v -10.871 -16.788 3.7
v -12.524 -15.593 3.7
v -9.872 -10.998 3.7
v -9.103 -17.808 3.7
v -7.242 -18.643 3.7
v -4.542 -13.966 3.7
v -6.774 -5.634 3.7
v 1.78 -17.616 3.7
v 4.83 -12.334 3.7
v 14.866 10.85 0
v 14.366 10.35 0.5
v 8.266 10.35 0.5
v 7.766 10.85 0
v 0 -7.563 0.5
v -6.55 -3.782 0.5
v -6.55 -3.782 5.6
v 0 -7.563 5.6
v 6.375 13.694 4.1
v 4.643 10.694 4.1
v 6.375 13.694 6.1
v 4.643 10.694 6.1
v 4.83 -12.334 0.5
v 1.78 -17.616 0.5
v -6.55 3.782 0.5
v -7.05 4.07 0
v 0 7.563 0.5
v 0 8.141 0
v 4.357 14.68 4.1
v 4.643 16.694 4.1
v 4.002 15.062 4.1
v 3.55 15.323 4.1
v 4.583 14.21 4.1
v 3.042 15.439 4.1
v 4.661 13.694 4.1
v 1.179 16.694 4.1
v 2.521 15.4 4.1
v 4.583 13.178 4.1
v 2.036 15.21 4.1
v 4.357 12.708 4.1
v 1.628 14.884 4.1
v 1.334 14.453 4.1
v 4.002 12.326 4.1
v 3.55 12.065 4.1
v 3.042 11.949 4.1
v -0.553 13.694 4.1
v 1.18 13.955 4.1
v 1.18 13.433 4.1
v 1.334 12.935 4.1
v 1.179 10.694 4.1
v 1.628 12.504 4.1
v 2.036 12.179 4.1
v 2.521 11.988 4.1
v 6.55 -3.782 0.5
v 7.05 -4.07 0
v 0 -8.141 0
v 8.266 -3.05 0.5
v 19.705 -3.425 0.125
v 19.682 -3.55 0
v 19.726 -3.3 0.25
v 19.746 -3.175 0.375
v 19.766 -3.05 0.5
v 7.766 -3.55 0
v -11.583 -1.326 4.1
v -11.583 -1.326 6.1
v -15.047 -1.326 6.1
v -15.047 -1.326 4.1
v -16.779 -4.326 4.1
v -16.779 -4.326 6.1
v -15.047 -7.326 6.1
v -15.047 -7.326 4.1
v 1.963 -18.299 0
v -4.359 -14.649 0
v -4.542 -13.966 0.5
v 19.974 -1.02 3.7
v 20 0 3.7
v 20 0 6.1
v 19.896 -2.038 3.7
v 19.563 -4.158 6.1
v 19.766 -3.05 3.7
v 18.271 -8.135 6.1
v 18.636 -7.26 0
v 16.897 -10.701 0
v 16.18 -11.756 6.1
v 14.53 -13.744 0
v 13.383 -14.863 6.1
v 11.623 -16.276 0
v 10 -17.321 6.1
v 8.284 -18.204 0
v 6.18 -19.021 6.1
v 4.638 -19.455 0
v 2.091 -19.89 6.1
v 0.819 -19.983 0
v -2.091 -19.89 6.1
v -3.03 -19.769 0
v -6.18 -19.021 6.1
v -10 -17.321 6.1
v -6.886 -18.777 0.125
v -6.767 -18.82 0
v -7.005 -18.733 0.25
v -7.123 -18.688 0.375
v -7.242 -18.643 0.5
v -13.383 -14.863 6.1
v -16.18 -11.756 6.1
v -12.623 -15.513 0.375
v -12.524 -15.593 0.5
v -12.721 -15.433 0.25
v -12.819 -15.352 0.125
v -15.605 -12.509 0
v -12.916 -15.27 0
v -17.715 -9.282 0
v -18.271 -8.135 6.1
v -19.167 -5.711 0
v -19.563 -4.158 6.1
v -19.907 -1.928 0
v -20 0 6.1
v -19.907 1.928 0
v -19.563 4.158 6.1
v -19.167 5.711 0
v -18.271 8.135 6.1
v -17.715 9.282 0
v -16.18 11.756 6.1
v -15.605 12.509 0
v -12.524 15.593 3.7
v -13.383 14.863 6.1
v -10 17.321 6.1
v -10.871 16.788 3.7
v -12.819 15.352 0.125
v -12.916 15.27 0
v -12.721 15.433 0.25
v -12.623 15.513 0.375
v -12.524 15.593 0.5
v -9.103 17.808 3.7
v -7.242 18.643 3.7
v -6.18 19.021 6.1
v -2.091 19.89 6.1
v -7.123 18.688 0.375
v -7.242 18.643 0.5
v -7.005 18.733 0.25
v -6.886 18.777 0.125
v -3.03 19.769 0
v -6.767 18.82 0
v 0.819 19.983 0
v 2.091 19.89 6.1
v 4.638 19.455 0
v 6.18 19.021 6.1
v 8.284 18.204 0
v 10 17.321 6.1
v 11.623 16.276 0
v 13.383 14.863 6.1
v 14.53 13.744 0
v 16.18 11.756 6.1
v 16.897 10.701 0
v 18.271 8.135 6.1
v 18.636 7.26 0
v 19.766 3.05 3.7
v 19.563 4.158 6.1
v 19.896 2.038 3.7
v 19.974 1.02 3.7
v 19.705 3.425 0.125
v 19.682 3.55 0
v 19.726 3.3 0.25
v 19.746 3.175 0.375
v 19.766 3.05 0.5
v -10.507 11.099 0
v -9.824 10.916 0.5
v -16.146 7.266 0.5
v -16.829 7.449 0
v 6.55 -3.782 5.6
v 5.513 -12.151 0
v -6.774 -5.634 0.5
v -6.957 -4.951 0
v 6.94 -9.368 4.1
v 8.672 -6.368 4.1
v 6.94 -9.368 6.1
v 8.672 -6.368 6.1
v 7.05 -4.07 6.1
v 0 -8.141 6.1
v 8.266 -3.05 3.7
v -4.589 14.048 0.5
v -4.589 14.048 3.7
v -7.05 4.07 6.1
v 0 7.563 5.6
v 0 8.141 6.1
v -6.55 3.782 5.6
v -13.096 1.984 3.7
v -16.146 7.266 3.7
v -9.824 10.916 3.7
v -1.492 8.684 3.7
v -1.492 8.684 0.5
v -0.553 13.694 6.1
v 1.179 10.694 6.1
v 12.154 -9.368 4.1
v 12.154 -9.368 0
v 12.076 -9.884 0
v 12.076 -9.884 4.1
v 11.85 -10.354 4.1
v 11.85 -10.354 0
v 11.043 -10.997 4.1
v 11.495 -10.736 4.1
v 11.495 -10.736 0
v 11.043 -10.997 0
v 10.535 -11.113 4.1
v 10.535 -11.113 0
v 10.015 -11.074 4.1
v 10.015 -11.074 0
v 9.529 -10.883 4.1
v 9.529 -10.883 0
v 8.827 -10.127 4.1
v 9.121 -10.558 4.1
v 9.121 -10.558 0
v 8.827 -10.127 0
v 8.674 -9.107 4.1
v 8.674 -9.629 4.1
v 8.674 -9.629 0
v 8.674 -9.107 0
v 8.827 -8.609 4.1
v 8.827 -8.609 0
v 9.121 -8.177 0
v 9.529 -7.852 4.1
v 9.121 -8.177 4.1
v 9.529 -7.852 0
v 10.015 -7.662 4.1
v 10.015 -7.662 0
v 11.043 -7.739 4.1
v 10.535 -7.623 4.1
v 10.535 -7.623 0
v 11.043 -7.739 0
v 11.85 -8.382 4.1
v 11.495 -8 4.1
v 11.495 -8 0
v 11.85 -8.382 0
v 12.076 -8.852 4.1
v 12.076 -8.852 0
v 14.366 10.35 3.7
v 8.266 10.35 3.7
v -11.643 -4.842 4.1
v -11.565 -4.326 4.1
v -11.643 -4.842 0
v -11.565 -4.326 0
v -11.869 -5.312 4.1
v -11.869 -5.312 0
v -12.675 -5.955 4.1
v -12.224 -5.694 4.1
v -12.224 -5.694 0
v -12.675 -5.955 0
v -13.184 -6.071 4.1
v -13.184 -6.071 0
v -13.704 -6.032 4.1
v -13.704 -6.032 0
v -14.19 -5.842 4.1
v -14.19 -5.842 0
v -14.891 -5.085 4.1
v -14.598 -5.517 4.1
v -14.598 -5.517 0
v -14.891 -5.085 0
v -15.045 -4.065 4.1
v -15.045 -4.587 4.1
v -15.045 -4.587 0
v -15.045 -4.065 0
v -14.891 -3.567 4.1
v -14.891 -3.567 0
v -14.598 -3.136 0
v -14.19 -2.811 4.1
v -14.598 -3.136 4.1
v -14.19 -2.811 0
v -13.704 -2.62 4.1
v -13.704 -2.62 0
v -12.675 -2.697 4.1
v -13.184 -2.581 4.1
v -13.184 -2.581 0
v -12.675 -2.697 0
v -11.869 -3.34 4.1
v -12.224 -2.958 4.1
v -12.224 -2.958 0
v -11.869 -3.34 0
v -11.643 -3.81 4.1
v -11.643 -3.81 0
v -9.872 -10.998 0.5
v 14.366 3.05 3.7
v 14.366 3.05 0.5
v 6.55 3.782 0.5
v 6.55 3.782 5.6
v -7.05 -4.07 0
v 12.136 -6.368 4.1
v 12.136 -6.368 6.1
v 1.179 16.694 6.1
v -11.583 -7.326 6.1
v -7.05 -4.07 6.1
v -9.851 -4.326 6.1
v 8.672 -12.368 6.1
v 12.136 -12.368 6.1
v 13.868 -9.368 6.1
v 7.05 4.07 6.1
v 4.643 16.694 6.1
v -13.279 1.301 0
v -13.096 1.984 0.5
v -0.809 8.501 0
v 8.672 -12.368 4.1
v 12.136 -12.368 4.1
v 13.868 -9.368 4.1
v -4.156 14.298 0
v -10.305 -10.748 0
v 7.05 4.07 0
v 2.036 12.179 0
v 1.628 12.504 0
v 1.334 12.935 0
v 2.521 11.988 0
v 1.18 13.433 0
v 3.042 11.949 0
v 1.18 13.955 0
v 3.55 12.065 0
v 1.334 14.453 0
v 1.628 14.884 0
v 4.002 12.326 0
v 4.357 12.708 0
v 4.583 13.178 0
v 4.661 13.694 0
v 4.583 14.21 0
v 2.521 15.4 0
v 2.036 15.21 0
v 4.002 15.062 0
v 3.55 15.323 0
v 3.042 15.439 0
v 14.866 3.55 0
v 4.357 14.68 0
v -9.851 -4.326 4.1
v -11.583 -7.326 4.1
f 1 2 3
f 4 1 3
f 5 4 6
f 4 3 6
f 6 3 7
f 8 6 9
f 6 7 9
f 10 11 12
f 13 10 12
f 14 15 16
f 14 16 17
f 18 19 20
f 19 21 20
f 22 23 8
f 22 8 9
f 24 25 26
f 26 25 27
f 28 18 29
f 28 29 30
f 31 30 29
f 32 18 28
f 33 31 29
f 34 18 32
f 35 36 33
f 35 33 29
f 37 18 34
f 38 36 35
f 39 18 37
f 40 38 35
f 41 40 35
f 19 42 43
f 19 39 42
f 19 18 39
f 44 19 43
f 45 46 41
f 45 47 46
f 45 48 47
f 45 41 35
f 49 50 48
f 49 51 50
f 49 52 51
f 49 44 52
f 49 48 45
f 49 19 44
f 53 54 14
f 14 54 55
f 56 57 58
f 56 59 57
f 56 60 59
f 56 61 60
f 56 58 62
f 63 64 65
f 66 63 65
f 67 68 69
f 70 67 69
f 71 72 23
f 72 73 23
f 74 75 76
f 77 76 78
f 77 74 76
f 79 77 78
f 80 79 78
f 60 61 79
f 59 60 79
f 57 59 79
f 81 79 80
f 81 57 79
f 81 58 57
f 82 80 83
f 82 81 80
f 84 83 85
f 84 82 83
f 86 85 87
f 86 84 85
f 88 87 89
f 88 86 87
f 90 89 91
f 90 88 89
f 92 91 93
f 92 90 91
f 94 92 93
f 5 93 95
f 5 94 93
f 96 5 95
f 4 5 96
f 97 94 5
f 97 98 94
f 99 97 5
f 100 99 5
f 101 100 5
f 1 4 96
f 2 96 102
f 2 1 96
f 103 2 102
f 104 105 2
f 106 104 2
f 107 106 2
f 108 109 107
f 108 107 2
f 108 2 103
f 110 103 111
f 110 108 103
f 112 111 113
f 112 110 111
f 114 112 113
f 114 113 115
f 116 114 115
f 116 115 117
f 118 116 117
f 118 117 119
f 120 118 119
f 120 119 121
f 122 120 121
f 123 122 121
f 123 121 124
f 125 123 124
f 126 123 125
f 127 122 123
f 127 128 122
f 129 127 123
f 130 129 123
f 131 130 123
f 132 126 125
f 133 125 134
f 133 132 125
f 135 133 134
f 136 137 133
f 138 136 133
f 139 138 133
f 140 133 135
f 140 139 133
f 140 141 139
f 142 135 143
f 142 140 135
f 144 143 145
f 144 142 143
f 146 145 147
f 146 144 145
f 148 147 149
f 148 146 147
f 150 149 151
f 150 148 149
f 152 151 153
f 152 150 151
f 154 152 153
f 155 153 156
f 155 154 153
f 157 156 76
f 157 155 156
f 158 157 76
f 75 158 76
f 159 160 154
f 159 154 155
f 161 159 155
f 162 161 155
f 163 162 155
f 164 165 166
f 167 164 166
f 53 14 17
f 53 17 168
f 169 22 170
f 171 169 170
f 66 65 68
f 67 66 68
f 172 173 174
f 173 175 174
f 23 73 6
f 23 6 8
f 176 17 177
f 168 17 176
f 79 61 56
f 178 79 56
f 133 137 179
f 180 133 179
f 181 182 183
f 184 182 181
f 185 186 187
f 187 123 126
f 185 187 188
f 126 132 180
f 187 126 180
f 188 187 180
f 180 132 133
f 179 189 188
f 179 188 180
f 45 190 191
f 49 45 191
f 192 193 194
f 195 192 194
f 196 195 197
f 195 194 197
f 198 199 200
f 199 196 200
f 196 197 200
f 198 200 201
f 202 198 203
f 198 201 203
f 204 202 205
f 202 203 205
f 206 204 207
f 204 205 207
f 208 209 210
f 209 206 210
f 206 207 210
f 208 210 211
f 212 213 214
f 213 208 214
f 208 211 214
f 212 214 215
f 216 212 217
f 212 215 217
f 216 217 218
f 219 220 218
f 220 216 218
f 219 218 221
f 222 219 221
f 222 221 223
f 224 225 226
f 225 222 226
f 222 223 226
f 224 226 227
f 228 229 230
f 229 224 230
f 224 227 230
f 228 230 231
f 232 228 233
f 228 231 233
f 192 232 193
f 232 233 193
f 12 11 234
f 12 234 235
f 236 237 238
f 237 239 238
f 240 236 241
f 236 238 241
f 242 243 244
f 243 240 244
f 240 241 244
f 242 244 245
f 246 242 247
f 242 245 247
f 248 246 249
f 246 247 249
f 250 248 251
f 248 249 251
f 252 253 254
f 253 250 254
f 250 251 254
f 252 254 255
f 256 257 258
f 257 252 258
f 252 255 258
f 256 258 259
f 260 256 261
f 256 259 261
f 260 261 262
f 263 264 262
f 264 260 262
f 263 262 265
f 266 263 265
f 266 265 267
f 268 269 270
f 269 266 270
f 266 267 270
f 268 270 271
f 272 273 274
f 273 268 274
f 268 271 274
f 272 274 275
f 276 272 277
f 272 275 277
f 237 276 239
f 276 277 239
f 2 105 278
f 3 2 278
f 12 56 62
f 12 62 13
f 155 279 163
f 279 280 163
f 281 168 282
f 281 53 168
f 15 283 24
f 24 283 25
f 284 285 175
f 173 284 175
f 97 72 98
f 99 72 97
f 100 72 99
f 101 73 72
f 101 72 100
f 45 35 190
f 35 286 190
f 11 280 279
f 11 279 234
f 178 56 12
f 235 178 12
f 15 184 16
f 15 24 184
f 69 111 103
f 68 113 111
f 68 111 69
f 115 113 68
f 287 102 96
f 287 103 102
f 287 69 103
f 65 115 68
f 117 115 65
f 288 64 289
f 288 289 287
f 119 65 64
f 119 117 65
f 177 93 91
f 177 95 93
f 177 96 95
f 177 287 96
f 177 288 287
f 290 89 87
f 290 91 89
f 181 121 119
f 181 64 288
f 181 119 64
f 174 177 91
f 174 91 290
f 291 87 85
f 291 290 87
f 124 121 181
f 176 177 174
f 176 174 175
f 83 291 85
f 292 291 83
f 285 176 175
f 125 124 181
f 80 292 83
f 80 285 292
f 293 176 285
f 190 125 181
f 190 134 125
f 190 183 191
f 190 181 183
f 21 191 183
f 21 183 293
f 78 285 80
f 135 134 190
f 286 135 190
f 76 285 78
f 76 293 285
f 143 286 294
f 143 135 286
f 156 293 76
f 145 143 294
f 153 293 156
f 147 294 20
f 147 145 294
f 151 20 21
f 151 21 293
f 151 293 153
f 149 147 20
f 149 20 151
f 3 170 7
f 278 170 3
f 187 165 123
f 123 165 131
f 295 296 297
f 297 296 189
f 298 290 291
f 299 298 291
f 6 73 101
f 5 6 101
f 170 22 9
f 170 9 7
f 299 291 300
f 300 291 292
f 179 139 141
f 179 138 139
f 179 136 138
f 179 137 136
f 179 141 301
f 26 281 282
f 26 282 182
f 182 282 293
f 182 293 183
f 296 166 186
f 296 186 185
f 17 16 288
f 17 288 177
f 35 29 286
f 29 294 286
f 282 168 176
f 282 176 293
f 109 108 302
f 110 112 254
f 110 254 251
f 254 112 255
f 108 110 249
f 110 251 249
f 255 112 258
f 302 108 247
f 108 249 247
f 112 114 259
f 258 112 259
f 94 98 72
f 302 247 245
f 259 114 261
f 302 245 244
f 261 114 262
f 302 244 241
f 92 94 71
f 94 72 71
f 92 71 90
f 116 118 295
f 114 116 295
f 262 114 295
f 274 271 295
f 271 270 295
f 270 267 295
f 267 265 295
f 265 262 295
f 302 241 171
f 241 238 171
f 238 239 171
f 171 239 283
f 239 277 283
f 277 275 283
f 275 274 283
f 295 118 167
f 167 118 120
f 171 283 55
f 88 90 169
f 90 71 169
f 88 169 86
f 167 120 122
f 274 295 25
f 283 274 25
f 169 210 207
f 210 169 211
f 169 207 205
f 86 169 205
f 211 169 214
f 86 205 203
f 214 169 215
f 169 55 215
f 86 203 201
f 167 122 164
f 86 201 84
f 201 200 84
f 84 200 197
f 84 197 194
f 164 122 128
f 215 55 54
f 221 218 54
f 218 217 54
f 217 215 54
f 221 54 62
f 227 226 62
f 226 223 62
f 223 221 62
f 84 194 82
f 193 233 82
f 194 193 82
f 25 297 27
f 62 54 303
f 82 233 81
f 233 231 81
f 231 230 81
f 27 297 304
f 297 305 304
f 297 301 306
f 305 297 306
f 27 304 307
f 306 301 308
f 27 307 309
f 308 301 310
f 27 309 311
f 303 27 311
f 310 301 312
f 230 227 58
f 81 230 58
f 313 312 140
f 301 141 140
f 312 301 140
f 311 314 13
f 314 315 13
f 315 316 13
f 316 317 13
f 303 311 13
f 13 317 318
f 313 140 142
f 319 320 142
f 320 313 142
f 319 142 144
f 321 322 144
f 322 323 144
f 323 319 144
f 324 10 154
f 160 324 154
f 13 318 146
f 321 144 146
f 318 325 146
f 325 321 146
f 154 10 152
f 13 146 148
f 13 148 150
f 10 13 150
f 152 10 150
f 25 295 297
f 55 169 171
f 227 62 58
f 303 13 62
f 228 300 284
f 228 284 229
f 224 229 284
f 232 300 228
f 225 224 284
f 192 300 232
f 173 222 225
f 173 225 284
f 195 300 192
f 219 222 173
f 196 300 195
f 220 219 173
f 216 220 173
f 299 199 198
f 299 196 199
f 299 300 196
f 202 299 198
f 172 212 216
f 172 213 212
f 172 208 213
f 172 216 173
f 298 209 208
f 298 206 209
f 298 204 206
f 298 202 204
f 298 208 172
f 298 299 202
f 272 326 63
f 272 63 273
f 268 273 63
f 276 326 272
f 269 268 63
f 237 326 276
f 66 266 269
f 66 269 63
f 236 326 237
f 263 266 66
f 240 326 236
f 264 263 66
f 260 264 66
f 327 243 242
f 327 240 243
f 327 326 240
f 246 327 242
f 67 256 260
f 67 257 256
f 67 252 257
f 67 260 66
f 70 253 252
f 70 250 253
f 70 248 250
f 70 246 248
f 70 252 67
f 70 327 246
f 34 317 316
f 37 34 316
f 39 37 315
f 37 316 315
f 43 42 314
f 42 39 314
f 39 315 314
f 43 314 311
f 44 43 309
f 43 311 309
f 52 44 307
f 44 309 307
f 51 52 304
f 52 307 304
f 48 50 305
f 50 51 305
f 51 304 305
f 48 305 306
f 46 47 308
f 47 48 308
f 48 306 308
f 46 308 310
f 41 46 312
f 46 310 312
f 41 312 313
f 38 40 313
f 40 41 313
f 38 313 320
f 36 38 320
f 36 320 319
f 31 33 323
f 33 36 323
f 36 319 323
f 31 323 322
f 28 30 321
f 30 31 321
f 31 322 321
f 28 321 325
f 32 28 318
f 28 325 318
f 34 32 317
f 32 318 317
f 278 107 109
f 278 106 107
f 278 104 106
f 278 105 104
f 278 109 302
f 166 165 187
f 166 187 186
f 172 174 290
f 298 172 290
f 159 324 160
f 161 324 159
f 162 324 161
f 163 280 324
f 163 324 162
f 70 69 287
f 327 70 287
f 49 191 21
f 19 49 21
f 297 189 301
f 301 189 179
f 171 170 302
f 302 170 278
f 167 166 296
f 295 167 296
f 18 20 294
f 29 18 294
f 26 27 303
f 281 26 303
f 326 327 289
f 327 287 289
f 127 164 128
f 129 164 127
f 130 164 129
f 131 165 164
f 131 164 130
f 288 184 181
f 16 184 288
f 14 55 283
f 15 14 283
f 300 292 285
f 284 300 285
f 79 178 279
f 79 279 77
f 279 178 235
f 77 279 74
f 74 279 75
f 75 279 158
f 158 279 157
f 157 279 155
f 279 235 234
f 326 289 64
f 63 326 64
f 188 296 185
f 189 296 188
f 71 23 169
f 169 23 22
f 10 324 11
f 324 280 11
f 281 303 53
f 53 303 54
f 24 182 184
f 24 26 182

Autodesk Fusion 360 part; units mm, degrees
sketch "Esquisse1" plane through (0, 0, 0) normal (0, 0, 1) x (1, 0, 0)
  circle A0 centre (0, 0) radius 20
  line L0 (19.7661, -3.05) -> (8.2661, -3.05)
  line L1 (8.2661, -3.05) -> (8.2661, 3.1)
  line L2 (14.3661, 3.05) -> (19.7661, 3.05)
  line L3 (8.2661, -3.05) -> (14.4604, -3.05)
  line L4 (14.3661, 10.35) -> (8.2661, 10.35)
  line L5 (8.2661, 10.35) -> (8.2661, -3.05)
  line L6 (0, 0) -> (29, 0) construction
  line L7 (14.3661, 3.05) -> (14.3661, 10.35)
  line L8 (-9.8244, 10.9164) -> (-16.1464, 7.2664)
  line L9 (-16.1464, 7.2664) -> (-13.0964, 1.9836)
  line L10 (-13.0964, 1.9836) -> (-1.4917, 8.6836)
  line L11 (-1.4917, 8.6836) -> (-4.5888, 14.0481)
  line L12 (-7.2417, 18.6429) -> (-1.4917, 8.6836)
  line L13 (-9.8244, 10.9164) -> (-12.5244, 15.5929)
  line L14 (-4.5417, -13.9664) -> (1.7803, -17.6164)
  line L15 (1.7803, -17.6164) -> (4.8303, -12.3336)
  line L16 (4.8303, -12.3336) -> (-6.7744, -5.6336)
  line L17 (-6.7744, -5.6336) -> (-9.8716, -10.9981)
  line L18 (-12.5244, -15.5929) -> (-6.7744, -5.6336)
  line L19 (-4.5417, -13.9664) -> (-7.2417, -18.6429)
  circle A1 centre (2.9108, 13.6941) radius 1.75
  line L20 (0, 0) -> (2.9108, 13.6941) construction
  circle A2 centre (-13.3148, -4.3262) radius 1.75
  circle A3 centre (10.404, -9.3678) radius 1.75
  line L21 (0, 7.5633) -> (-6.55, 3.7816)
  line L22 (-6.55, 3.7816) -> (-6.55, -3.7816)
  line L23 (-6.55, -3.7816) -> (0, -7.5633)
  line L24 (0, -7.5633) -> (6.55, -3.7816)
  line L25 (6.55, -3.7816) -> (6.55, 3.7816)
  line L26 (6.55, 3.7816) -> (0, 7.5633)
  dimension "d1" = 40
  dimension "d2" = 6.1
  dimension "d3" = 11.5
  dimension "d6" = 6.1
  dimension "d7" = 3.05
  dimension "d8" = 13.4
  dimension "d10" = 360
  dimension "d16" = 3.5
  dimension "d17" = 78
  dimension "d19" = 360
  dimension "d21" = 14
  dimension "d25" = 6.55
extrude "Extrusion1" add sketch "Esquisse1" along normal blind 6.1 contours A0 L0 L1 L2 L3 L4 L5 L7 | A0 L0 L1 L2 L3 L4 L5 L7 L8 L9 L10 L11 L12 L13 L14 L15 L16 L17 L18 L19 | A0 L8 L9 L10 L11 L12 L13 | A0 L14 L15 L16 L17 L18 L19 | A1 | A2 | A3 | L21 L22 L23 L24 L25 L26
extrude "Extrusion2" cut sketch "Esquisse1" along normal blind 3.7 contours A0 L0 L1 L2 L3 L4 L5 L7 | A0 L8 L9 L10 L11 L12 L13 | A0 L14 L15 L16 L17 L18 L19
extrude "Extrusion3" cut sketch "Esquisse1" along normal blind 6.1 contours A1 | A2 | A3
chamfer "Chanfrein1" distance 0.5 angle 45 15 edges at (-4.3667, 13.6633, 0) (-11.1744, 13.2546, 0) (-12.9854, 9.0914, 0) (-14.6214, 4.625, 0) (-7.294, 5.3336, 0) (-9.6494, -10.6133, 0) (-0.972, -8.9836, 0) (-5.8917, -16.3046, 0) (-1.3807, -15.7914, 0) (3.3053, -14.975, 0) (8.2661, 3.65, 0) (14.0161, -3.05, 0) (17.0661, 3.05, 0) (14.3661, 6.7, 0) (11.3161, 10.35, 0)
extrude "Extrusion4" cut sketch "Esquisse1" along normal blind 6.1 contours L21 L22 L23 L24 L25 L26
chamfer "Chanfrein2" distance 0.5 angle 45 6 edges at (-3.275, -5.6725, 6.1) (-6.55, 0, 6.1) (-3.275, 5.6725, 6.1) (3.275, 5.6725, 6.1) (6.55, 0, 6.1) (3.275, -5.6725, 6.1)
chamfer "Chanfrein3" distance 0.5 angle 45 6 edges at (-6.55, 0, 0) (-3.275, -5.6725, 0) (3.275, -5.6725, 0) (6.55, 0, 0) (3.275, 5.6725, 0) (-3.275, 5.6725, 0)
sketch "Esquisse3" plane through (0, 0, 6.1) normal (0, 0, 1) x (-1, 0, 0)
  circle A0 centre (0, 0) radius 20
  circle A1 centre (-2.9108, -13.6941) radius 1.75
  circle A2 centre (13.3148, 4.3262) radius 1.75
  circle A3 centre (-10.404, 9.3678) radius 1.75
  line L0 (-7.05, -4.0703) -> (-7.05, 4.0703)
  line L1 (-7.05, 4.0703) -> (0, 8.1406)
  line L2 (0, 8.1406) -> (7.05, 4.0703)
  line L3 (7.05, 4.0703) -> (7.05, -4.0703)
  line L4 (7.05, -4.0703) -> (0, -8.1406)
  line L5 (0, -8.1406) -> (-7.05, -4.0703)
  line L6 (-4.6428, -10.6941) -> (-6.3749, -13.6941)
  line L7 (-6.3749, -13.6941) -> (-4.6428, -16.6941)
  line L8 (-4.6428, -16.6941) -> (-1.1787, -16.6941)
  line L9 (-1.1787, -16.6941) -> (0.5533, -13.6941)
  line L10 (0.5533, -13.6941) -> (-1.1787, -10.6941)
  line L11 (-1.1787, -10.6941) -> (-4.6428, -10.6941)
  line L12 (9.8507, 4.3262) -> (11.5827, 1.3262)
  line L13 (11.5827, 7.3262) -> (9.8507, 4.3262)
  line L14 (15.0468, 7.3262) -> (11.5827, 7.3262)
  line L15 (16.7789, 4.3262) -> (15.0468, 7.3262)
  line L16 (15.0468, 1.3262) -> (16.7789, 4.3262)
  line L17 (11.5827, 1.3262) -> (15.0468, 1.3262)
  line L18 (-8.672, 6.3678) -> (-6.9399, 9.3678)
  line L19 (-12.1361, 6.3678) -> (-8.672, 6.3678)
  line L20 (-13.8681, 9.3678) -> (-12.1361, 6.3678)
  line L21 (-12.1361, 12.3678) -> (-13.8681, 9.3678)
  line L22 (-8.672, 12.3678) -> (-12.1361, 12.3678)
  line L23 (-6.9399, 9.3678) -> (-8.672, 12.3678)
  point P0 (-2.9108, -13.6941)
  dimension "d30" = 3
  dimension "d32" = 360
extrude "Extrusion5" cut sketch "Esquisse3" against normal blind 2 contours L6 L7 L8 L9 L10 L11 | L12 L13 L14 L15 L16 L17 | L18 L19 L20 L21 L22 L23
equation "d6 = d2"
equation "d7 = d2 / 2"
